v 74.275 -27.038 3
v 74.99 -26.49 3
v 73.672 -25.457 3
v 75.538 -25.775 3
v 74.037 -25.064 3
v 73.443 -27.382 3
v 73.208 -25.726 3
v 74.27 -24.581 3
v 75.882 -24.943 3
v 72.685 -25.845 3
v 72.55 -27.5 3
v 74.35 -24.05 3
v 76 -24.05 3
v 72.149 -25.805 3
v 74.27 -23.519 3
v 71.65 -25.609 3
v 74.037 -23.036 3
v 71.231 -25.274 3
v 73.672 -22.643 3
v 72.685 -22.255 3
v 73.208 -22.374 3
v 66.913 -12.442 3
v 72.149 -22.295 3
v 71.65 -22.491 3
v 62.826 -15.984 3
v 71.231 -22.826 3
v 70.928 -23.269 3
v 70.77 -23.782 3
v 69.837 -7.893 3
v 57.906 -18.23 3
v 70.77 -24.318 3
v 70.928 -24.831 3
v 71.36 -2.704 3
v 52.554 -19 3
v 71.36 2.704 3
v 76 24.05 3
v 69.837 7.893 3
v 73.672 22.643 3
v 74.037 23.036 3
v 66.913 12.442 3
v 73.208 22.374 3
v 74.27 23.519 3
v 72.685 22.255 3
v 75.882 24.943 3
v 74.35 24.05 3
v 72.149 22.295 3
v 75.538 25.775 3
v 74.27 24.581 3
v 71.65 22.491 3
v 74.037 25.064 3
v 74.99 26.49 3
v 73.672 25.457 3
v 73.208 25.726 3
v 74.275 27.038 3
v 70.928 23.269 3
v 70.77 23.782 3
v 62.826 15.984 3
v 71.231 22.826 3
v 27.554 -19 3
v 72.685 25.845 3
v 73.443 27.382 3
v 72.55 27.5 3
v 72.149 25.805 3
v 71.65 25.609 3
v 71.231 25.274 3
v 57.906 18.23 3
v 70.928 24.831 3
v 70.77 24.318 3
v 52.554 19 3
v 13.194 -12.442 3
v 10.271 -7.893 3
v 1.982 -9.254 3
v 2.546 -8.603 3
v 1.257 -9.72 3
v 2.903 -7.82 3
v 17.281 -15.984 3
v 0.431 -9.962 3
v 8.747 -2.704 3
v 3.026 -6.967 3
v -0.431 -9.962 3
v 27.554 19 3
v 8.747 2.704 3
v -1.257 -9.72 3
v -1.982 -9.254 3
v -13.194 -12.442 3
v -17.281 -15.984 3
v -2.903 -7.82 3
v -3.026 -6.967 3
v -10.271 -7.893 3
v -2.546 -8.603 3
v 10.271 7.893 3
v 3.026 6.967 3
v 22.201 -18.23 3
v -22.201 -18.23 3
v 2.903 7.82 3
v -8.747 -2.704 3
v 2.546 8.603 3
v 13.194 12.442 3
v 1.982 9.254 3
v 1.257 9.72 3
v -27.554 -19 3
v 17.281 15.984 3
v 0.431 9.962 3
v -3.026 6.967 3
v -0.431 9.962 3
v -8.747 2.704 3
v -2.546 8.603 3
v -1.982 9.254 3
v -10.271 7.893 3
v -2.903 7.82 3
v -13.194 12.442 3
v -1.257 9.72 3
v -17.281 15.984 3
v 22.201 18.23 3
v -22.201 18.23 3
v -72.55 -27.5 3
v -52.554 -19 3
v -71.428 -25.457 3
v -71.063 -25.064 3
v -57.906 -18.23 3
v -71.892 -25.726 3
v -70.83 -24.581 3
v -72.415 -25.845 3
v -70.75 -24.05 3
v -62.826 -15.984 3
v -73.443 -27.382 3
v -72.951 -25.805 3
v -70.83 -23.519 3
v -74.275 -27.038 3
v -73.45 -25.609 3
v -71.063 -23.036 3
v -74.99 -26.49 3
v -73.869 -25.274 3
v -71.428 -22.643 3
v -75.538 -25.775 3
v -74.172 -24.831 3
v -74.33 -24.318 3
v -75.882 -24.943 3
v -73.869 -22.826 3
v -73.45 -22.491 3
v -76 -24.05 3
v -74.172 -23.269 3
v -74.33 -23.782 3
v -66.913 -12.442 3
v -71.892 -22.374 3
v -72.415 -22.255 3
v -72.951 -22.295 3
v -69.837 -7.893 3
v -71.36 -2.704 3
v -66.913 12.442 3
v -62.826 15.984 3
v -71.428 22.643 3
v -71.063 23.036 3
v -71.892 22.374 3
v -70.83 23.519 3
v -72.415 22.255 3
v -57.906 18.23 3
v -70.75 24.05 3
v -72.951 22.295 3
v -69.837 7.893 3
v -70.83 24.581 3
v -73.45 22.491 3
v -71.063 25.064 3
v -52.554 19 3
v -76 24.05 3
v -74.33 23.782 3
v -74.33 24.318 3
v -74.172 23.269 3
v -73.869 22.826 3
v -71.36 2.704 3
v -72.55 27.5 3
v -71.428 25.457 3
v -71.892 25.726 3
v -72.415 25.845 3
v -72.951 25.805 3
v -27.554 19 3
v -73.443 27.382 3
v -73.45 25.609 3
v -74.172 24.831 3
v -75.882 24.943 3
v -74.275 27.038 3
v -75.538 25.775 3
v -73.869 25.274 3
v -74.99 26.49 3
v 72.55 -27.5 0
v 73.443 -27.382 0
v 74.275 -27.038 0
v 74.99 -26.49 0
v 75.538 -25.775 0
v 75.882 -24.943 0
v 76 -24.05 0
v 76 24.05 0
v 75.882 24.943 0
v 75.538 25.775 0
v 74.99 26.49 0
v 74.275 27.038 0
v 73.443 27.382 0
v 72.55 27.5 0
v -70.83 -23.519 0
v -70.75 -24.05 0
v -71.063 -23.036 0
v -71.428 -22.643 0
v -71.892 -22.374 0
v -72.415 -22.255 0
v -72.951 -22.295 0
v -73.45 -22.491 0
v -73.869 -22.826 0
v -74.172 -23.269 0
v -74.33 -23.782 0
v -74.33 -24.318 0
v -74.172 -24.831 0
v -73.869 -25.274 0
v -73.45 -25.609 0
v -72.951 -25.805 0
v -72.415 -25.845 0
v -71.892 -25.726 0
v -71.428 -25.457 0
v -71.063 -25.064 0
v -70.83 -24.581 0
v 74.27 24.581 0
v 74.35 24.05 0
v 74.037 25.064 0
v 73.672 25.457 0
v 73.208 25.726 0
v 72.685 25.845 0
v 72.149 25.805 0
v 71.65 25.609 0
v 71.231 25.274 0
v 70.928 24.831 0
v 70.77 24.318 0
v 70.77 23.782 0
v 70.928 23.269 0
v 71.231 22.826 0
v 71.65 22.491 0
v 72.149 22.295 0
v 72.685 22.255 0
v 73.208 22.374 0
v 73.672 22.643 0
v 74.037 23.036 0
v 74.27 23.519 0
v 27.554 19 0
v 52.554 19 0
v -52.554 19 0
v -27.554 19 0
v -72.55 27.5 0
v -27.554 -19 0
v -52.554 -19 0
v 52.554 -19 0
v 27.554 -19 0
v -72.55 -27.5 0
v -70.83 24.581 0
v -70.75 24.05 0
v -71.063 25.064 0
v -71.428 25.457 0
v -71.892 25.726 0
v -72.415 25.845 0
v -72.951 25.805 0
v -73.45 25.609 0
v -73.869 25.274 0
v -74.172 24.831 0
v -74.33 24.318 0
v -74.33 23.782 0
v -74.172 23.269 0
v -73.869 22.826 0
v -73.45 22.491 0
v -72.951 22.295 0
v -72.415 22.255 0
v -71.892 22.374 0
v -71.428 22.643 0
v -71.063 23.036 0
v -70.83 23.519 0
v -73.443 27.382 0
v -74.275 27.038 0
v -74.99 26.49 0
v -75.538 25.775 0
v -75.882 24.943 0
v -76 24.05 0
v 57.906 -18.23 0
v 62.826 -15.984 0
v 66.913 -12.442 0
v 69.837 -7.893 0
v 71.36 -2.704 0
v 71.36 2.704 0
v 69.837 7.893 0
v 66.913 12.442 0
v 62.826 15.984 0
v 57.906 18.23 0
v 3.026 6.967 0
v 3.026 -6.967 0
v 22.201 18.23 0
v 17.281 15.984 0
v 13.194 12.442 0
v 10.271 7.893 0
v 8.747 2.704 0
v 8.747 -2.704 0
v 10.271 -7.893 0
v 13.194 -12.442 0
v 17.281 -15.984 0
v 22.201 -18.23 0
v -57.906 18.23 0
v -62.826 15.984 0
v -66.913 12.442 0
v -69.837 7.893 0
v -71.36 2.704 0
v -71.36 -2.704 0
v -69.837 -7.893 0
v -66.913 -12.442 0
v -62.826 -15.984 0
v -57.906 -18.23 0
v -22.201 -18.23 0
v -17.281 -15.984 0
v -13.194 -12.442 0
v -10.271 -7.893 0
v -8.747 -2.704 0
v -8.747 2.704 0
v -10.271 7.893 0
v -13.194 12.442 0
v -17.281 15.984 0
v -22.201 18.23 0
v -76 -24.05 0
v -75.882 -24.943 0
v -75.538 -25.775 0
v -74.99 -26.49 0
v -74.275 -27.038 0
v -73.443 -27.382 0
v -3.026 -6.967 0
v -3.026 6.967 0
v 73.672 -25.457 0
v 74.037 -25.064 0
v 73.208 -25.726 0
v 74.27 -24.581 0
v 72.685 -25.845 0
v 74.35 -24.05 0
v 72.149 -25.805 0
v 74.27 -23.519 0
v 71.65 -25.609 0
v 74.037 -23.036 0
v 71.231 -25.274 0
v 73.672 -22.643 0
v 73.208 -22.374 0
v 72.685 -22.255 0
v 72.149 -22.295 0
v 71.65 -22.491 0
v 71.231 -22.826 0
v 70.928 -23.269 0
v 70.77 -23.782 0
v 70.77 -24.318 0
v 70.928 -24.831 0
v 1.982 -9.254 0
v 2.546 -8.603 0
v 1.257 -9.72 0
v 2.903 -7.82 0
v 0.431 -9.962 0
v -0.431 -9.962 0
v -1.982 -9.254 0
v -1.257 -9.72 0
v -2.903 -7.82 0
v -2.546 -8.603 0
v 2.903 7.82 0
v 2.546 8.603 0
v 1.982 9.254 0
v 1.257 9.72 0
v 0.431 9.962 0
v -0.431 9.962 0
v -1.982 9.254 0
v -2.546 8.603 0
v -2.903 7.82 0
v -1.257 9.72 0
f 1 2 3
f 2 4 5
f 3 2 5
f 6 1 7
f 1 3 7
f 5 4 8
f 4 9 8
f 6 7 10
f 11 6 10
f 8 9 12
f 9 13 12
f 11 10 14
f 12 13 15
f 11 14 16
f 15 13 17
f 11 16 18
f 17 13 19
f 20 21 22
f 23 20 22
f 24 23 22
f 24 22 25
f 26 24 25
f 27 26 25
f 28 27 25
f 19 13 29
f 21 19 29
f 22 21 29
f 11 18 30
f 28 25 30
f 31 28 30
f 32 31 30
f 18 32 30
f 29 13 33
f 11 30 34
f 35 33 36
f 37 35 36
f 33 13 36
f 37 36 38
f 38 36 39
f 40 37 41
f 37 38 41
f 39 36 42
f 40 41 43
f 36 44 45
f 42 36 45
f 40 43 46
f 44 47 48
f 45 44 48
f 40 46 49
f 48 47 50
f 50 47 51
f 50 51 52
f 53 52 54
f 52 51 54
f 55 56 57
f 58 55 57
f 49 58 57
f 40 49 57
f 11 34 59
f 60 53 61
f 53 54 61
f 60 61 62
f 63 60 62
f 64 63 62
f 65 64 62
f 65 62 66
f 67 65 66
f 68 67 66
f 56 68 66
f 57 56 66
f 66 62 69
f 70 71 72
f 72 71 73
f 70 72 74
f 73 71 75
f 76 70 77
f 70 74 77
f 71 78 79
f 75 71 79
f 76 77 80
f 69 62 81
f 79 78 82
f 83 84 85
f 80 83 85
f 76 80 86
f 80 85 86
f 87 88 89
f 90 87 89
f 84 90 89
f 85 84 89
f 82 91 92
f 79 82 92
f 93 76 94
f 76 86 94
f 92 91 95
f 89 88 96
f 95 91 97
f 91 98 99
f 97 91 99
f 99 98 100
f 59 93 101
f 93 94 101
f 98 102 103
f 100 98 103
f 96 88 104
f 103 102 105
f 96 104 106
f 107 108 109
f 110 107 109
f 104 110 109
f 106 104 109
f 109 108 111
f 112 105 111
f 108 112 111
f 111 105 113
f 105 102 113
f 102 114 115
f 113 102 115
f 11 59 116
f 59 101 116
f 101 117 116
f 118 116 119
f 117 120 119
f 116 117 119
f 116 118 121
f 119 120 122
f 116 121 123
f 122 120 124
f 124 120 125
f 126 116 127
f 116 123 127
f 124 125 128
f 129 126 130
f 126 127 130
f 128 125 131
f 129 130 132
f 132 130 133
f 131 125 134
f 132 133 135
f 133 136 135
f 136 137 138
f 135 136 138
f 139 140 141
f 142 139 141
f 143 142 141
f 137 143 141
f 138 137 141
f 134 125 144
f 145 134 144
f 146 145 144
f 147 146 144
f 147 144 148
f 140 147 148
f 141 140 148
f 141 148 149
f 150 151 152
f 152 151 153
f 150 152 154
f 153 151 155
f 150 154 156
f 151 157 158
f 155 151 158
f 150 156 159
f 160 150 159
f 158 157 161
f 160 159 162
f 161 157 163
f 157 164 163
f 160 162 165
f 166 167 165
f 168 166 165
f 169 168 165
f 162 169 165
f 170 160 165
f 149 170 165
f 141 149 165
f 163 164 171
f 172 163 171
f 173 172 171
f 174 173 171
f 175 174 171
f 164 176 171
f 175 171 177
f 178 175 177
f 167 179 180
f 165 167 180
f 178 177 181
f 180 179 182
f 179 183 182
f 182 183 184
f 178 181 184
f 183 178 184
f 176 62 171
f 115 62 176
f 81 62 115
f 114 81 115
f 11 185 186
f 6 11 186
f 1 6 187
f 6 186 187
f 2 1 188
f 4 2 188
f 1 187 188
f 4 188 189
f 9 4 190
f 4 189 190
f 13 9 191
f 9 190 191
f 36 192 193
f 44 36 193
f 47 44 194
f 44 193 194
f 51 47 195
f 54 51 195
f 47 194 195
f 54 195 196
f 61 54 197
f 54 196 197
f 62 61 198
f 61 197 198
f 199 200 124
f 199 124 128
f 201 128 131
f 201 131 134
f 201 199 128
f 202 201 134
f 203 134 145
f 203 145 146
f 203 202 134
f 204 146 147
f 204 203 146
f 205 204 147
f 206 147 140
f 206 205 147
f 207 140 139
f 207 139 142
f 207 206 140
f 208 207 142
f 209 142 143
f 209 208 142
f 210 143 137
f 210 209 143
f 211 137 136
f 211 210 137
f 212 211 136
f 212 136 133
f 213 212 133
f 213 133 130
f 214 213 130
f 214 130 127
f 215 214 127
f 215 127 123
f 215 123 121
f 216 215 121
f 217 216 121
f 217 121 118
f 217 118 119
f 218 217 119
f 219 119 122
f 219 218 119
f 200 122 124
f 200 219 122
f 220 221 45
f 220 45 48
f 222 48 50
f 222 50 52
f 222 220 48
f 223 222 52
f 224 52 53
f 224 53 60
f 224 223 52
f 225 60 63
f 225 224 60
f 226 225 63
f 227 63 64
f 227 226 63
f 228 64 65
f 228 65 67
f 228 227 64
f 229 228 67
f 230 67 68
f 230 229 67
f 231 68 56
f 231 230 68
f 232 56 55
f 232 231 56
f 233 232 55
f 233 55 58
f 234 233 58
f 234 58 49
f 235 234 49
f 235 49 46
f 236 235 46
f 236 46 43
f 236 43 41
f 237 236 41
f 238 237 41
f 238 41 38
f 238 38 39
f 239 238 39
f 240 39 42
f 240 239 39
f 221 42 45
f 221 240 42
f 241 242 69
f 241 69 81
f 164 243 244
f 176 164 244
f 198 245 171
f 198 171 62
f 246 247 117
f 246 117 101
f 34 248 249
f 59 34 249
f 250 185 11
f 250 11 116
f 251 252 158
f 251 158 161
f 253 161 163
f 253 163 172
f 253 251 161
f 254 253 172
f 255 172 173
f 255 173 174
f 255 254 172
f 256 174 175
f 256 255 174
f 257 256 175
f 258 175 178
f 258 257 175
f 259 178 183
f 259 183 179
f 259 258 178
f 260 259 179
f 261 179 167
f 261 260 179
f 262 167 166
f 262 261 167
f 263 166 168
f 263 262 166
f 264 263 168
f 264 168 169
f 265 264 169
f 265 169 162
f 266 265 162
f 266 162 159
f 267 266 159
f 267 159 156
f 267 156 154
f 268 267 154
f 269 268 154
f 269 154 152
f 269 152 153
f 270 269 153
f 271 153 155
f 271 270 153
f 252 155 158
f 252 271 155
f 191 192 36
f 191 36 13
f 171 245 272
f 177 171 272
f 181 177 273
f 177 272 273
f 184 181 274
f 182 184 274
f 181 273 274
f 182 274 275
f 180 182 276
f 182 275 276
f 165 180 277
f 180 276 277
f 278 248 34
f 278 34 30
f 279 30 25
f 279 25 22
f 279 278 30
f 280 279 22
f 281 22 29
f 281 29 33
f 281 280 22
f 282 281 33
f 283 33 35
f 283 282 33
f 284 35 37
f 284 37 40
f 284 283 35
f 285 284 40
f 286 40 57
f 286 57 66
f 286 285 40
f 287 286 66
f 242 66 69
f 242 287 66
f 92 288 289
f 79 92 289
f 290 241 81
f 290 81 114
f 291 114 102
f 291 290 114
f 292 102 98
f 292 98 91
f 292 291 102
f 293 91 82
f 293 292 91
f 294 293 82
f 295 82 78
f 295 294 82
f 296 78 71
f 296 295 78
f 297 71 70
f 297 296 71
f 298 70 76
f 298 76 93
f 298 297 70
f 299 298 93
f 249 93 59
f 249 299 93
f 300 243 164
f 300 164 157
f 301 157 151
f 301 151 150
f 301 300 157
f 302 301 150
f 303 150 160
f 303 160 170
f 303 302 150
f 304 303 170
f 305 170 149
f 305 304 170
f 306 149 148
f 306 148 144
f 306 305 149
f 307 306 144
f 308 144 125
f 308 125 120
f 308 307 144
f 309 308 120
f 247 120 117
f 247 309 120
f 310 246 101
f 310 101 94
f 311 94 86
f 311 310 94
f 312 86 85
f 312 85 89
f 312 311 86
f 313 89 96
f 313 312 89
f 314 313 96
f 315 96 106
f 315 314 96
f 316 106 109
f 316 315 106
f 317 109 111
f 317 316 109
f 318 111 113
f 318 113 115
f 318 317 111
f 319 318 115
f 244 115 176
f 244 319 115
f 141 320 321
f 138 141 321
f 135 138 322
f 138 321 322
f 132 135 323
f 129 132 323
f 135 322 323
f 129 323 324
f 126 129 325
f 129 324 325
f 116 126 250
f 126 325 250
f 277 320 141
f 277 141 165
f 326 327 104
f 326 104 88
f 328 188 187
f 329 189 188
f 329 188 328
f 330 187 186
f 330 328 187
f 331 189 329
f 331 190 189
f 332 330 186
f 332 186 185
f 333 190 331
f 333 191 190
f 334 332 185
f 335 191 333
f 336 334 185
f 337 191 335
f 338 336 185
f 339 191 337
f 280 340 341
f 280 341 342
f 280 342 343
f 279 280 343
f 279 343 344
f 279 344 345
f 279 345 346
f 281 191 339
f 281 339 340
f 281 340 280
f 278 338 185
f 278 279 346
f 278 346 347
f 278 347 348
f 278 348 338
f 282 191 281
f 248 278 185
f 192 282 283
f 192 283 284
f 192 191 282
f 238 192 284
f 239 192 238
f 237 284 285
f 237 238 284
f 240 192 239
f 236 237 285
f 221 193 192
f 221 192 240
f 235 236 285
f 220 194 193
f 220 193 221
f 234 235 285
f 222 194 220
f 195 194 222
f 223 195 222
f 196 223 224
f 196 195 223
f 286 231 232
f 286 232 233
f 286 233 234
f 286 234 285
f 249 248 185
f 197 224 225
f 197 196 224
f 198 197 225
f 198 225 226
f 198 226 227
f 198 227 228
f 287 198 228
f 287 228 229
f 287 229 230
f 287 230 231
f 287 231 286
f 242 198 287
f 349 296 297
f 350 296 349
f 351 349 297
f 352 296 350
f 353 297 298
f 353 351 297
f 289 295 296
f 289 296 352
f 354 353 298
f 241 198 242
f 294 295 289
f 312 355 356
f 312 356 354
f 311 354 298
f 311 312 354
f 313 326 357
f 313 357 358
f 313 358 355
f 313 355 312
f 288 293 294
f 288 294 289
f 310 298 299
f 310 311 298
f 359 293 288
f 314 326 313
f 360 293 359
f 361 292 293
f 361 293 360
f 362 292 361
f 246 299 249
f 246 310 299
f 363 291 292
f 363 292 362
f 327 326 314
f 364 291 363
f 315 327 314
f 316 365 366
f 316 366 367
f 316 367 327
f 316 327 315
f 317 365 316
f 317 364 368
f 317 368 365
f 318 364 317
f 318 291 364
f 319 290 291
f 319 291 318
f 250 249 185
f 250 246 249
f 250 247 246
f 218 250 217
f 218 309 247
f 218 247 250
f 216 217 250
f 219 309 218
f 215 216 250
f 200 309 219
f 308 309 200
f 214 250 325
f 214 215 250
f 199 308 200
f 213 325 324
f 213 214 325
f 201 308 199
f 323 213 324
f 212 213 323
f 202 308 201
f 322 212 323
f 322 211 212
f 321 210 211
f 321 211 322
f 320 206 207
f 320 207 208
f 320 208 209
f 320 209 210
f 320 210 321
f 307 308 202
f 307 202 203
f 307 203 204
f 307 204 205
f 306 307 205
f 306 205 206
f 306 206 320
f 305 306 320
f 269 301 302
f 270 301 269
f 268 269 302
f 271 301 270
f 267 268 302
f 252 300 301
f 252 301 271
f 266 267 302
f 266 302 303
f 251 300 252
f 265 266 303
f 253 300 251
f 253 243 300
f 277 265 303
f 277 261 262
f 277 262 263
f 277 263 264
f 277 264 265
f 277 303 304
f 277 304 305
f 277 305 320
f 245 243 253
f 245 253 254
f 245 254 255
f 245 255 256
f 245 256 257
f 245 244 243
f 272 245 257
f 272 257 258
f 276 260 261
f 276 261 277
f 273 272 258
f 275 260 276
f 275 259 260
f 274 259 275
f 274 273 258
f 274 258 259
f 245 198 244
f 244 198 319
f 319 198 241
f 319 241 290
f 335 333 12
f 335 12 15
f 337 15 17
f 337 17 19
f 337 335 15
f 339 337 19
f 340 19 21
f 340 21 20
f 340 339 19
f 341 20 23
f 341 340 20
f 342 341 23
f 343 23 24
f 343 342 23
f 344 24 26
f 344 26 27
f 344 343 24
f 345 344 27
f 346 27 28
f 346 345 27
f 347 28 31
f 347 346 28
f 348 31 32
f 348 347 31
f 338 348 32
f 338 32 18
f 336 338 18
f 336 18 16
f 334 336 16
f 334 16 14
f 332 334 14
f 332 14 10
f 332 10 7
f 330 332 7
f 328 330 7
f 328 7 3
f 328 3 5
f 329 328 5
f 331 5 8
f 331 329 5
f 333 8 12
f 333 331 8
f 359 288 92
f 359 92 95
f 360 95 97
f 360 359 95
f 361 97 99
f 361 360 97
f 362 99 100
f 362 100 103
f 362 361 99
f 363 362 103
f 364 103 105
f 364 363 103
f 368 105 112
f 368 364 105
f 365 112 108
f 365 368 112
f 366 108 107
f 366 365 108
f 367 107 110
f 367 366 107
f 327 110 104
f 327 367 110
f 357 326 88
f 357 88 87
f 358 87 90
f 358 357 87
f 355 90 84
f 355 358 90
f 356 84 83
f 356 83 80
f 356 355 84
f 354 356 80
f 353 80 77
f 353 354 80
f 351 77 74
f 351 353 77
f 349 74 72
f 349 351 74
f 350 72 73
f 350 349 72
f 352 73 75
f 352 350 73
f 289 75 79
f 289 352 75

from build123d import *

# Parameters (mm, degrees)
SKETCH_R  = 1.8
PAD_DEPTH = 3


with BuildPart() as part:
    # Sketch → Pad (new body)
    with BuildSketch(Plane.XY):
        with BuildLine():
            Line((-72.55, 27.5), (72.55, 27.5))
            ThreePointArc((76, 24.05), (74.989518, 26.489518), (72.55, 27.5))
            Line((76, 24.05), (76, -24.05))
            ThreePointArc((72.55, -27.5), (74.989518, -26.489518), (76, -24.05))
            Line((72.55, -27.5), (-72.55, -27.5))
            ThreePointArc((-76, -24.05), (-74.989518, -26.489518), (-72.55, -27.5))
            Line((-76, -24.05), (-76, 24.05))
            ThreePointArc((-72.55, 27.5), (-74.989518, 26.489518), (-76, 24.05))
        make_face()
        with Locations((-72.55, -24.05)):
            Circle(SKETCH_R, mode=Mode.SUBTRACT)
        with Locations((-72.55, 24.05)):
            Circle(SKETCH_R, mode=Mode.SUBTRACT)
        with Locations((72.55, 24.05)):
            Circle(SKETCH_R, mode=Mode.SUBTRACT)
        with Locations((72.55, -24.05)):
            Circle(SKETCH_R, mode=Mode.SUBTRACT)
        with BuildLine():
            ThreePointArc((-52.553572, 19), (-71.553572, 0), (-52.553572, -19))
            Line((-52.553572, -19), (-27.553572, -19))
            ThreePointArc((-27.553572, -19), (-8.553572, 0), (-27.553572, 19))
            Line((-52.553572, 19), (-27.553572, 19))
        make_face(mode=Mode.SUBTRACT)
        with BuildLine():
            ThreePointArc((3.026002, 6.967062), (0, 9.993064), (-3.026002, 6.967062))
            Line((-3.026002, 6.967062), (-3.026002, -6.967062))
            ThreePointArc((-3.026002, -6.967062), (0, -9.993064), (3.026002, -6.967062))
            Line((3.026002, 6.967062), (3.026002, -6.967062))
        make_face(mode=Mode.SUBTRACT)
        with BuildLine():
            ThreePointArc((52.553572, -19), (71.553572, 0), (52.553572, 19))
            Line((52.553572, 19), (27.553572, 19))
            ThreePointArc((27.553572, 19), (8.553572, 0), (27.553572, -19))
            Line((52.553572, -19), (27.553572, -19))
        make_face(mode=Mode.SUBTRACT)
    extrude(amount=PAD_DEPTH)


solid = part.part
